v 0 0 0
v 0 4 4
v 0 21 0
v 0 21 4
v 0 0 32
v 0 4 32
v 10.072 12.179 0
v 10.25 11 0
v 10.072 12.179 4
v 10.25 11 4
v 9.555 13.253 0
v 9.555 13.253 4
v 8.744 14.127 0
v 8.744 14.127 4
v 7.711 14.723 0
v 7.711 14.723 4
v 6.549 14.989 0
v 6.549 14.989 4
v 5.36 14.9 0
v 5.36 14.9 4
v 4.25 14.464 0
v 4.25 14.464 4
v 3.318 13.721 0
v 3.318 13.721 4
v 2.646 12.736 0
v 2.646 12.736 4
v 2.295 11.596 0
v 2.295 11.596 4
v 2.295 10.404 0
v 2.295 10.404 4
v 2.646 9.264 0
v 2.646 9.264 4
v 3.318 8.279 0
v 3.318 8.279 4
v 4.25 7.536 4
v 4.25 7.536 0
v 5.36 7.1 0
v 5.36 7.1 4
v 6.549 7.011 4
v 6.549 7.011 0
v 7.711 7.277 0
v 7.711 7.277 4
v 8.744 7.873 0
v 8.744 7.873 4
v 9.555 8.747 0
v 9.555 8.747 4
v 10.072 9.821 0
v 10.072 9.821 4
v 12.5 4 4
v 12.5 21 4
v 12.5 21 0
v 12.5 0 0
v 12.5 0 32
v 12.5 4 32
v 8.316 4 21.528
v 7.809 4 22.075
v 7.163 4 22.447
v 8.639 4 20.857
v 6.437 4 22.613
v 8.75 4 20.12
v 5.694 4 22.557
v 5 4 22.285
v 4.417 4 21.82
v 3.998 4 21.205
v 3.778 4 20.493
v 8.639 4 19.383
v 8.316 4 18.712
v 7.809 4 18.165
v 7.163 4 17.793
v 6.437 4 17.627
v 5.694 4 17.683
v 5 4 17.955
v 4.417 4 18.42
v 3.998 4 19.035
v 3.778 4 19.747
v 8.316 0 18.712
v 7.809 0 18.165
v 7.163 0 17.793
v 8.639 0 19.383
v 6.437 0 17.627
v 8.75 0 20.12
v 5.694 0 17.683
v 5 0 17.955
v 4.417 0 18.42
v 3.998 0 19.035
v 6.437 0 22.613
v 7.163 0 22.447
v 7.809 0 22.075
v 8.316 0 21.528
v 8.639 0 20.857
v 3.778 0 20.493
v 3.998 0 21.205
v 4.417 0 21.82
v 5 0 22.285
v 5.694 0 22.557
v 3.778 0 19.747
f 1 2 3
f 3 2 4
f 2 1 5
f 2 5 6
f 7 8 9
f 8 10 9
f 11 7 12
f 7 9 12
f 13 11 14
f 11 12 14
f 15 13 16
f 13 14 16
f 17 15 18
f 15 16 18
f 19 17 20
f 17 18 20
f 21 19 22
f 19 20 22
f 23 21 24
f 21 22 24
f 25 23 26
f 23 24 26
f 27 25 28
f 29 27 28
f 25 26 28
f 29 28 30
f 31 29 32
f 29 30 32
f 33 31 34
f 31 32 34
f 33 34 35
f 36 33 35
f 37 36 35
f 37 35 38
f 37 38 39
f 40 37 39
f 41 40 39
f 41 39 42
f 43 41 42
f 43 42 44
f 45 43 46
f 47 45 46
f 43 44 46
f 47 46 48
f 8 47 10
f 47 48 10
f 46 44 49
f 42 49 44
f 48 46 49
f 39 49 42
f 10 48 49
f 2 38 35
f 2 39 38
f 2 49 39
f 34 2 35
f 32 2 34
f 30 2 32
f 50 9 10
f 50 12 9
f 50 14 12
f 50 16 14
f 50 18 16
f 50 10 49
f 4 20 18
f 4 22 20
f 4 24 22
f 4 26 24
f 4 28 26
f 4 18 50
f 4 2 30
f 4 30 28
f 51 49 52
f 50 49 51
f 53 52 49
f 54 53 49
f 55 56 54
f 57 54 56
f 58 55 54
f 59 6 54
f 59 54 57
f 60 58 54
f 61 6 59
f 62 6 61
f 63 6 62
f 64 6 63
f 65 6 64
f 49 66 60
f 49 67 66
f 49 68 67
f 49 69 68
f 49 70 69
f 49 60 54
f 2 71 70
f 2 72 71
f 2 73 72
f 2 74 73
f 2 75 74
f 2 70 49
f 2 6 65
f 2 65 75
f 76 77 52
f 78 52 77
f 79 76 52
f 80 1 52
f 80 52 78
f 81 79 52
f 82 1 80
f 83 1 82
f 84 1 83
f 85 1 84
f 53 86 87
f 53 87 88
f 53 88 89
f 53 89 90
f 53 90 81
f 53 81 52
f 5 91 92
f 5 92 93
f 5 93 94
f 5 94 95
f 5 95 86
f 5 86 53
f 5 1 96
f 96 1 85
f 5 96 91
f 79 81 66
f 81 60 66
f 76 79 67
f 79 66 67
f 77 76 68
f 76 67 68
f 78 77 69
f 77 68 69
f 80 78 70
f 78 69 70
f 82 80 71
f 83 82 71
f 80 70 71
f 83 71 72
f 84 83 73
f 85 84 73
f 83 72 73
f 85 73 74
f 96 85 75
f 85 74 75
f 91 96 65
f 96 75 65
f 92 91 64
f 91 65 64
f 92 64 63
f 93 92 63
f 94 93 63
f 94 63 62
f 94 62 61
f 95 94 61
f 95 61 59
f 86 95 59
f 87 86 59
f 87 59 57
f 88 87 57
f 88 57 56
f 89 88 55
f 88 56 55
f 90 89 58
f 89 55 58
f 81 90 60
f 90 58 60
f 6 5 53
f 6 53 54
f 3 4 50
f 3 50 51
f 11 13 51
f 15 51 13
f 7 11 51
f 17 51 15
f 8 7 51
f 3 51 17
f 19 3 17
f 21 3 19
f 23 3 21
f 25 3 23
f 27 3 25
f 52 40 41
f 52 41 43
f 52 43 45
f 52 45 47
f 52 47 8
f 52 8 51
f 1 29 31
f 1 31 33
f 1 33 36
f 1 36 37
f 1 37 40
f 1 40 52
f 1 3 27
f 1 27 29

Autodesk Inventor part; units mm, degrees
ref_plane "YZ Plane" through (0, 0, 0) normal (1, 0, 0) x (0, 1, 0)
ref_plane "XZ Plane" through (0, 0, 0) normal (0, 1, 0) x (-1, 0, 0)
ref_plane "XY Plane" through (0, 0, 0) normal (0, 0, 1) x (1, 0, 0)
sketch "草圖1" plane through (0, 0, 0) normal (1, 0, 0) x (0, 1, 0)
  line L0 (0, 0) -> (0, 32)
  line L1 (0, 32) -> (4, 32)
  line L2 (4, 32) -> (4, 4)
  line L3 (4, 4) -> (21, 4)
  line L4 (21, 4) -> (21, 0)
  line L5 (21, 0) -> (0, 0)
  dimension "d0" = 32
  dimension "d1" = 21
  dimension "d2" = 4
  dimension "d3" = 4
extrude "擠出1" add sketch "草圖1" along normal blind 12.5
sketch "草圖2" plane through (0, 4, 32) normal (0, 1, 0) x (1, 0, 0)
  circle A0 centre (6.25, 11.88) radius 2.5
  line L0 (0, 0) -> (12.5, 0) projected
  point P0 (0, 32)
  dimension "d6" = 5
  dimension "d7" = 11.88
extrude "擠出2" cut sketch "草圖2" against normal blind 12.5
sketch "草圖3" plane through (0, 4, 4) normal (0, 0, 1) x (1, 0, 0)
  circle A0 centre (6.25, 7) radius 4
  line L0 (0, 0) -> (0, 17) projected
  line L1 (0, -4) -> (12.5, -4) projected
  dimension "d10" = 8
  dimension "d11" = 6.25
  dimension "d12" = 11
extrude "擠出3" cut sketch "草圖3" against normal blind 12.5
properties part number "L形件"
